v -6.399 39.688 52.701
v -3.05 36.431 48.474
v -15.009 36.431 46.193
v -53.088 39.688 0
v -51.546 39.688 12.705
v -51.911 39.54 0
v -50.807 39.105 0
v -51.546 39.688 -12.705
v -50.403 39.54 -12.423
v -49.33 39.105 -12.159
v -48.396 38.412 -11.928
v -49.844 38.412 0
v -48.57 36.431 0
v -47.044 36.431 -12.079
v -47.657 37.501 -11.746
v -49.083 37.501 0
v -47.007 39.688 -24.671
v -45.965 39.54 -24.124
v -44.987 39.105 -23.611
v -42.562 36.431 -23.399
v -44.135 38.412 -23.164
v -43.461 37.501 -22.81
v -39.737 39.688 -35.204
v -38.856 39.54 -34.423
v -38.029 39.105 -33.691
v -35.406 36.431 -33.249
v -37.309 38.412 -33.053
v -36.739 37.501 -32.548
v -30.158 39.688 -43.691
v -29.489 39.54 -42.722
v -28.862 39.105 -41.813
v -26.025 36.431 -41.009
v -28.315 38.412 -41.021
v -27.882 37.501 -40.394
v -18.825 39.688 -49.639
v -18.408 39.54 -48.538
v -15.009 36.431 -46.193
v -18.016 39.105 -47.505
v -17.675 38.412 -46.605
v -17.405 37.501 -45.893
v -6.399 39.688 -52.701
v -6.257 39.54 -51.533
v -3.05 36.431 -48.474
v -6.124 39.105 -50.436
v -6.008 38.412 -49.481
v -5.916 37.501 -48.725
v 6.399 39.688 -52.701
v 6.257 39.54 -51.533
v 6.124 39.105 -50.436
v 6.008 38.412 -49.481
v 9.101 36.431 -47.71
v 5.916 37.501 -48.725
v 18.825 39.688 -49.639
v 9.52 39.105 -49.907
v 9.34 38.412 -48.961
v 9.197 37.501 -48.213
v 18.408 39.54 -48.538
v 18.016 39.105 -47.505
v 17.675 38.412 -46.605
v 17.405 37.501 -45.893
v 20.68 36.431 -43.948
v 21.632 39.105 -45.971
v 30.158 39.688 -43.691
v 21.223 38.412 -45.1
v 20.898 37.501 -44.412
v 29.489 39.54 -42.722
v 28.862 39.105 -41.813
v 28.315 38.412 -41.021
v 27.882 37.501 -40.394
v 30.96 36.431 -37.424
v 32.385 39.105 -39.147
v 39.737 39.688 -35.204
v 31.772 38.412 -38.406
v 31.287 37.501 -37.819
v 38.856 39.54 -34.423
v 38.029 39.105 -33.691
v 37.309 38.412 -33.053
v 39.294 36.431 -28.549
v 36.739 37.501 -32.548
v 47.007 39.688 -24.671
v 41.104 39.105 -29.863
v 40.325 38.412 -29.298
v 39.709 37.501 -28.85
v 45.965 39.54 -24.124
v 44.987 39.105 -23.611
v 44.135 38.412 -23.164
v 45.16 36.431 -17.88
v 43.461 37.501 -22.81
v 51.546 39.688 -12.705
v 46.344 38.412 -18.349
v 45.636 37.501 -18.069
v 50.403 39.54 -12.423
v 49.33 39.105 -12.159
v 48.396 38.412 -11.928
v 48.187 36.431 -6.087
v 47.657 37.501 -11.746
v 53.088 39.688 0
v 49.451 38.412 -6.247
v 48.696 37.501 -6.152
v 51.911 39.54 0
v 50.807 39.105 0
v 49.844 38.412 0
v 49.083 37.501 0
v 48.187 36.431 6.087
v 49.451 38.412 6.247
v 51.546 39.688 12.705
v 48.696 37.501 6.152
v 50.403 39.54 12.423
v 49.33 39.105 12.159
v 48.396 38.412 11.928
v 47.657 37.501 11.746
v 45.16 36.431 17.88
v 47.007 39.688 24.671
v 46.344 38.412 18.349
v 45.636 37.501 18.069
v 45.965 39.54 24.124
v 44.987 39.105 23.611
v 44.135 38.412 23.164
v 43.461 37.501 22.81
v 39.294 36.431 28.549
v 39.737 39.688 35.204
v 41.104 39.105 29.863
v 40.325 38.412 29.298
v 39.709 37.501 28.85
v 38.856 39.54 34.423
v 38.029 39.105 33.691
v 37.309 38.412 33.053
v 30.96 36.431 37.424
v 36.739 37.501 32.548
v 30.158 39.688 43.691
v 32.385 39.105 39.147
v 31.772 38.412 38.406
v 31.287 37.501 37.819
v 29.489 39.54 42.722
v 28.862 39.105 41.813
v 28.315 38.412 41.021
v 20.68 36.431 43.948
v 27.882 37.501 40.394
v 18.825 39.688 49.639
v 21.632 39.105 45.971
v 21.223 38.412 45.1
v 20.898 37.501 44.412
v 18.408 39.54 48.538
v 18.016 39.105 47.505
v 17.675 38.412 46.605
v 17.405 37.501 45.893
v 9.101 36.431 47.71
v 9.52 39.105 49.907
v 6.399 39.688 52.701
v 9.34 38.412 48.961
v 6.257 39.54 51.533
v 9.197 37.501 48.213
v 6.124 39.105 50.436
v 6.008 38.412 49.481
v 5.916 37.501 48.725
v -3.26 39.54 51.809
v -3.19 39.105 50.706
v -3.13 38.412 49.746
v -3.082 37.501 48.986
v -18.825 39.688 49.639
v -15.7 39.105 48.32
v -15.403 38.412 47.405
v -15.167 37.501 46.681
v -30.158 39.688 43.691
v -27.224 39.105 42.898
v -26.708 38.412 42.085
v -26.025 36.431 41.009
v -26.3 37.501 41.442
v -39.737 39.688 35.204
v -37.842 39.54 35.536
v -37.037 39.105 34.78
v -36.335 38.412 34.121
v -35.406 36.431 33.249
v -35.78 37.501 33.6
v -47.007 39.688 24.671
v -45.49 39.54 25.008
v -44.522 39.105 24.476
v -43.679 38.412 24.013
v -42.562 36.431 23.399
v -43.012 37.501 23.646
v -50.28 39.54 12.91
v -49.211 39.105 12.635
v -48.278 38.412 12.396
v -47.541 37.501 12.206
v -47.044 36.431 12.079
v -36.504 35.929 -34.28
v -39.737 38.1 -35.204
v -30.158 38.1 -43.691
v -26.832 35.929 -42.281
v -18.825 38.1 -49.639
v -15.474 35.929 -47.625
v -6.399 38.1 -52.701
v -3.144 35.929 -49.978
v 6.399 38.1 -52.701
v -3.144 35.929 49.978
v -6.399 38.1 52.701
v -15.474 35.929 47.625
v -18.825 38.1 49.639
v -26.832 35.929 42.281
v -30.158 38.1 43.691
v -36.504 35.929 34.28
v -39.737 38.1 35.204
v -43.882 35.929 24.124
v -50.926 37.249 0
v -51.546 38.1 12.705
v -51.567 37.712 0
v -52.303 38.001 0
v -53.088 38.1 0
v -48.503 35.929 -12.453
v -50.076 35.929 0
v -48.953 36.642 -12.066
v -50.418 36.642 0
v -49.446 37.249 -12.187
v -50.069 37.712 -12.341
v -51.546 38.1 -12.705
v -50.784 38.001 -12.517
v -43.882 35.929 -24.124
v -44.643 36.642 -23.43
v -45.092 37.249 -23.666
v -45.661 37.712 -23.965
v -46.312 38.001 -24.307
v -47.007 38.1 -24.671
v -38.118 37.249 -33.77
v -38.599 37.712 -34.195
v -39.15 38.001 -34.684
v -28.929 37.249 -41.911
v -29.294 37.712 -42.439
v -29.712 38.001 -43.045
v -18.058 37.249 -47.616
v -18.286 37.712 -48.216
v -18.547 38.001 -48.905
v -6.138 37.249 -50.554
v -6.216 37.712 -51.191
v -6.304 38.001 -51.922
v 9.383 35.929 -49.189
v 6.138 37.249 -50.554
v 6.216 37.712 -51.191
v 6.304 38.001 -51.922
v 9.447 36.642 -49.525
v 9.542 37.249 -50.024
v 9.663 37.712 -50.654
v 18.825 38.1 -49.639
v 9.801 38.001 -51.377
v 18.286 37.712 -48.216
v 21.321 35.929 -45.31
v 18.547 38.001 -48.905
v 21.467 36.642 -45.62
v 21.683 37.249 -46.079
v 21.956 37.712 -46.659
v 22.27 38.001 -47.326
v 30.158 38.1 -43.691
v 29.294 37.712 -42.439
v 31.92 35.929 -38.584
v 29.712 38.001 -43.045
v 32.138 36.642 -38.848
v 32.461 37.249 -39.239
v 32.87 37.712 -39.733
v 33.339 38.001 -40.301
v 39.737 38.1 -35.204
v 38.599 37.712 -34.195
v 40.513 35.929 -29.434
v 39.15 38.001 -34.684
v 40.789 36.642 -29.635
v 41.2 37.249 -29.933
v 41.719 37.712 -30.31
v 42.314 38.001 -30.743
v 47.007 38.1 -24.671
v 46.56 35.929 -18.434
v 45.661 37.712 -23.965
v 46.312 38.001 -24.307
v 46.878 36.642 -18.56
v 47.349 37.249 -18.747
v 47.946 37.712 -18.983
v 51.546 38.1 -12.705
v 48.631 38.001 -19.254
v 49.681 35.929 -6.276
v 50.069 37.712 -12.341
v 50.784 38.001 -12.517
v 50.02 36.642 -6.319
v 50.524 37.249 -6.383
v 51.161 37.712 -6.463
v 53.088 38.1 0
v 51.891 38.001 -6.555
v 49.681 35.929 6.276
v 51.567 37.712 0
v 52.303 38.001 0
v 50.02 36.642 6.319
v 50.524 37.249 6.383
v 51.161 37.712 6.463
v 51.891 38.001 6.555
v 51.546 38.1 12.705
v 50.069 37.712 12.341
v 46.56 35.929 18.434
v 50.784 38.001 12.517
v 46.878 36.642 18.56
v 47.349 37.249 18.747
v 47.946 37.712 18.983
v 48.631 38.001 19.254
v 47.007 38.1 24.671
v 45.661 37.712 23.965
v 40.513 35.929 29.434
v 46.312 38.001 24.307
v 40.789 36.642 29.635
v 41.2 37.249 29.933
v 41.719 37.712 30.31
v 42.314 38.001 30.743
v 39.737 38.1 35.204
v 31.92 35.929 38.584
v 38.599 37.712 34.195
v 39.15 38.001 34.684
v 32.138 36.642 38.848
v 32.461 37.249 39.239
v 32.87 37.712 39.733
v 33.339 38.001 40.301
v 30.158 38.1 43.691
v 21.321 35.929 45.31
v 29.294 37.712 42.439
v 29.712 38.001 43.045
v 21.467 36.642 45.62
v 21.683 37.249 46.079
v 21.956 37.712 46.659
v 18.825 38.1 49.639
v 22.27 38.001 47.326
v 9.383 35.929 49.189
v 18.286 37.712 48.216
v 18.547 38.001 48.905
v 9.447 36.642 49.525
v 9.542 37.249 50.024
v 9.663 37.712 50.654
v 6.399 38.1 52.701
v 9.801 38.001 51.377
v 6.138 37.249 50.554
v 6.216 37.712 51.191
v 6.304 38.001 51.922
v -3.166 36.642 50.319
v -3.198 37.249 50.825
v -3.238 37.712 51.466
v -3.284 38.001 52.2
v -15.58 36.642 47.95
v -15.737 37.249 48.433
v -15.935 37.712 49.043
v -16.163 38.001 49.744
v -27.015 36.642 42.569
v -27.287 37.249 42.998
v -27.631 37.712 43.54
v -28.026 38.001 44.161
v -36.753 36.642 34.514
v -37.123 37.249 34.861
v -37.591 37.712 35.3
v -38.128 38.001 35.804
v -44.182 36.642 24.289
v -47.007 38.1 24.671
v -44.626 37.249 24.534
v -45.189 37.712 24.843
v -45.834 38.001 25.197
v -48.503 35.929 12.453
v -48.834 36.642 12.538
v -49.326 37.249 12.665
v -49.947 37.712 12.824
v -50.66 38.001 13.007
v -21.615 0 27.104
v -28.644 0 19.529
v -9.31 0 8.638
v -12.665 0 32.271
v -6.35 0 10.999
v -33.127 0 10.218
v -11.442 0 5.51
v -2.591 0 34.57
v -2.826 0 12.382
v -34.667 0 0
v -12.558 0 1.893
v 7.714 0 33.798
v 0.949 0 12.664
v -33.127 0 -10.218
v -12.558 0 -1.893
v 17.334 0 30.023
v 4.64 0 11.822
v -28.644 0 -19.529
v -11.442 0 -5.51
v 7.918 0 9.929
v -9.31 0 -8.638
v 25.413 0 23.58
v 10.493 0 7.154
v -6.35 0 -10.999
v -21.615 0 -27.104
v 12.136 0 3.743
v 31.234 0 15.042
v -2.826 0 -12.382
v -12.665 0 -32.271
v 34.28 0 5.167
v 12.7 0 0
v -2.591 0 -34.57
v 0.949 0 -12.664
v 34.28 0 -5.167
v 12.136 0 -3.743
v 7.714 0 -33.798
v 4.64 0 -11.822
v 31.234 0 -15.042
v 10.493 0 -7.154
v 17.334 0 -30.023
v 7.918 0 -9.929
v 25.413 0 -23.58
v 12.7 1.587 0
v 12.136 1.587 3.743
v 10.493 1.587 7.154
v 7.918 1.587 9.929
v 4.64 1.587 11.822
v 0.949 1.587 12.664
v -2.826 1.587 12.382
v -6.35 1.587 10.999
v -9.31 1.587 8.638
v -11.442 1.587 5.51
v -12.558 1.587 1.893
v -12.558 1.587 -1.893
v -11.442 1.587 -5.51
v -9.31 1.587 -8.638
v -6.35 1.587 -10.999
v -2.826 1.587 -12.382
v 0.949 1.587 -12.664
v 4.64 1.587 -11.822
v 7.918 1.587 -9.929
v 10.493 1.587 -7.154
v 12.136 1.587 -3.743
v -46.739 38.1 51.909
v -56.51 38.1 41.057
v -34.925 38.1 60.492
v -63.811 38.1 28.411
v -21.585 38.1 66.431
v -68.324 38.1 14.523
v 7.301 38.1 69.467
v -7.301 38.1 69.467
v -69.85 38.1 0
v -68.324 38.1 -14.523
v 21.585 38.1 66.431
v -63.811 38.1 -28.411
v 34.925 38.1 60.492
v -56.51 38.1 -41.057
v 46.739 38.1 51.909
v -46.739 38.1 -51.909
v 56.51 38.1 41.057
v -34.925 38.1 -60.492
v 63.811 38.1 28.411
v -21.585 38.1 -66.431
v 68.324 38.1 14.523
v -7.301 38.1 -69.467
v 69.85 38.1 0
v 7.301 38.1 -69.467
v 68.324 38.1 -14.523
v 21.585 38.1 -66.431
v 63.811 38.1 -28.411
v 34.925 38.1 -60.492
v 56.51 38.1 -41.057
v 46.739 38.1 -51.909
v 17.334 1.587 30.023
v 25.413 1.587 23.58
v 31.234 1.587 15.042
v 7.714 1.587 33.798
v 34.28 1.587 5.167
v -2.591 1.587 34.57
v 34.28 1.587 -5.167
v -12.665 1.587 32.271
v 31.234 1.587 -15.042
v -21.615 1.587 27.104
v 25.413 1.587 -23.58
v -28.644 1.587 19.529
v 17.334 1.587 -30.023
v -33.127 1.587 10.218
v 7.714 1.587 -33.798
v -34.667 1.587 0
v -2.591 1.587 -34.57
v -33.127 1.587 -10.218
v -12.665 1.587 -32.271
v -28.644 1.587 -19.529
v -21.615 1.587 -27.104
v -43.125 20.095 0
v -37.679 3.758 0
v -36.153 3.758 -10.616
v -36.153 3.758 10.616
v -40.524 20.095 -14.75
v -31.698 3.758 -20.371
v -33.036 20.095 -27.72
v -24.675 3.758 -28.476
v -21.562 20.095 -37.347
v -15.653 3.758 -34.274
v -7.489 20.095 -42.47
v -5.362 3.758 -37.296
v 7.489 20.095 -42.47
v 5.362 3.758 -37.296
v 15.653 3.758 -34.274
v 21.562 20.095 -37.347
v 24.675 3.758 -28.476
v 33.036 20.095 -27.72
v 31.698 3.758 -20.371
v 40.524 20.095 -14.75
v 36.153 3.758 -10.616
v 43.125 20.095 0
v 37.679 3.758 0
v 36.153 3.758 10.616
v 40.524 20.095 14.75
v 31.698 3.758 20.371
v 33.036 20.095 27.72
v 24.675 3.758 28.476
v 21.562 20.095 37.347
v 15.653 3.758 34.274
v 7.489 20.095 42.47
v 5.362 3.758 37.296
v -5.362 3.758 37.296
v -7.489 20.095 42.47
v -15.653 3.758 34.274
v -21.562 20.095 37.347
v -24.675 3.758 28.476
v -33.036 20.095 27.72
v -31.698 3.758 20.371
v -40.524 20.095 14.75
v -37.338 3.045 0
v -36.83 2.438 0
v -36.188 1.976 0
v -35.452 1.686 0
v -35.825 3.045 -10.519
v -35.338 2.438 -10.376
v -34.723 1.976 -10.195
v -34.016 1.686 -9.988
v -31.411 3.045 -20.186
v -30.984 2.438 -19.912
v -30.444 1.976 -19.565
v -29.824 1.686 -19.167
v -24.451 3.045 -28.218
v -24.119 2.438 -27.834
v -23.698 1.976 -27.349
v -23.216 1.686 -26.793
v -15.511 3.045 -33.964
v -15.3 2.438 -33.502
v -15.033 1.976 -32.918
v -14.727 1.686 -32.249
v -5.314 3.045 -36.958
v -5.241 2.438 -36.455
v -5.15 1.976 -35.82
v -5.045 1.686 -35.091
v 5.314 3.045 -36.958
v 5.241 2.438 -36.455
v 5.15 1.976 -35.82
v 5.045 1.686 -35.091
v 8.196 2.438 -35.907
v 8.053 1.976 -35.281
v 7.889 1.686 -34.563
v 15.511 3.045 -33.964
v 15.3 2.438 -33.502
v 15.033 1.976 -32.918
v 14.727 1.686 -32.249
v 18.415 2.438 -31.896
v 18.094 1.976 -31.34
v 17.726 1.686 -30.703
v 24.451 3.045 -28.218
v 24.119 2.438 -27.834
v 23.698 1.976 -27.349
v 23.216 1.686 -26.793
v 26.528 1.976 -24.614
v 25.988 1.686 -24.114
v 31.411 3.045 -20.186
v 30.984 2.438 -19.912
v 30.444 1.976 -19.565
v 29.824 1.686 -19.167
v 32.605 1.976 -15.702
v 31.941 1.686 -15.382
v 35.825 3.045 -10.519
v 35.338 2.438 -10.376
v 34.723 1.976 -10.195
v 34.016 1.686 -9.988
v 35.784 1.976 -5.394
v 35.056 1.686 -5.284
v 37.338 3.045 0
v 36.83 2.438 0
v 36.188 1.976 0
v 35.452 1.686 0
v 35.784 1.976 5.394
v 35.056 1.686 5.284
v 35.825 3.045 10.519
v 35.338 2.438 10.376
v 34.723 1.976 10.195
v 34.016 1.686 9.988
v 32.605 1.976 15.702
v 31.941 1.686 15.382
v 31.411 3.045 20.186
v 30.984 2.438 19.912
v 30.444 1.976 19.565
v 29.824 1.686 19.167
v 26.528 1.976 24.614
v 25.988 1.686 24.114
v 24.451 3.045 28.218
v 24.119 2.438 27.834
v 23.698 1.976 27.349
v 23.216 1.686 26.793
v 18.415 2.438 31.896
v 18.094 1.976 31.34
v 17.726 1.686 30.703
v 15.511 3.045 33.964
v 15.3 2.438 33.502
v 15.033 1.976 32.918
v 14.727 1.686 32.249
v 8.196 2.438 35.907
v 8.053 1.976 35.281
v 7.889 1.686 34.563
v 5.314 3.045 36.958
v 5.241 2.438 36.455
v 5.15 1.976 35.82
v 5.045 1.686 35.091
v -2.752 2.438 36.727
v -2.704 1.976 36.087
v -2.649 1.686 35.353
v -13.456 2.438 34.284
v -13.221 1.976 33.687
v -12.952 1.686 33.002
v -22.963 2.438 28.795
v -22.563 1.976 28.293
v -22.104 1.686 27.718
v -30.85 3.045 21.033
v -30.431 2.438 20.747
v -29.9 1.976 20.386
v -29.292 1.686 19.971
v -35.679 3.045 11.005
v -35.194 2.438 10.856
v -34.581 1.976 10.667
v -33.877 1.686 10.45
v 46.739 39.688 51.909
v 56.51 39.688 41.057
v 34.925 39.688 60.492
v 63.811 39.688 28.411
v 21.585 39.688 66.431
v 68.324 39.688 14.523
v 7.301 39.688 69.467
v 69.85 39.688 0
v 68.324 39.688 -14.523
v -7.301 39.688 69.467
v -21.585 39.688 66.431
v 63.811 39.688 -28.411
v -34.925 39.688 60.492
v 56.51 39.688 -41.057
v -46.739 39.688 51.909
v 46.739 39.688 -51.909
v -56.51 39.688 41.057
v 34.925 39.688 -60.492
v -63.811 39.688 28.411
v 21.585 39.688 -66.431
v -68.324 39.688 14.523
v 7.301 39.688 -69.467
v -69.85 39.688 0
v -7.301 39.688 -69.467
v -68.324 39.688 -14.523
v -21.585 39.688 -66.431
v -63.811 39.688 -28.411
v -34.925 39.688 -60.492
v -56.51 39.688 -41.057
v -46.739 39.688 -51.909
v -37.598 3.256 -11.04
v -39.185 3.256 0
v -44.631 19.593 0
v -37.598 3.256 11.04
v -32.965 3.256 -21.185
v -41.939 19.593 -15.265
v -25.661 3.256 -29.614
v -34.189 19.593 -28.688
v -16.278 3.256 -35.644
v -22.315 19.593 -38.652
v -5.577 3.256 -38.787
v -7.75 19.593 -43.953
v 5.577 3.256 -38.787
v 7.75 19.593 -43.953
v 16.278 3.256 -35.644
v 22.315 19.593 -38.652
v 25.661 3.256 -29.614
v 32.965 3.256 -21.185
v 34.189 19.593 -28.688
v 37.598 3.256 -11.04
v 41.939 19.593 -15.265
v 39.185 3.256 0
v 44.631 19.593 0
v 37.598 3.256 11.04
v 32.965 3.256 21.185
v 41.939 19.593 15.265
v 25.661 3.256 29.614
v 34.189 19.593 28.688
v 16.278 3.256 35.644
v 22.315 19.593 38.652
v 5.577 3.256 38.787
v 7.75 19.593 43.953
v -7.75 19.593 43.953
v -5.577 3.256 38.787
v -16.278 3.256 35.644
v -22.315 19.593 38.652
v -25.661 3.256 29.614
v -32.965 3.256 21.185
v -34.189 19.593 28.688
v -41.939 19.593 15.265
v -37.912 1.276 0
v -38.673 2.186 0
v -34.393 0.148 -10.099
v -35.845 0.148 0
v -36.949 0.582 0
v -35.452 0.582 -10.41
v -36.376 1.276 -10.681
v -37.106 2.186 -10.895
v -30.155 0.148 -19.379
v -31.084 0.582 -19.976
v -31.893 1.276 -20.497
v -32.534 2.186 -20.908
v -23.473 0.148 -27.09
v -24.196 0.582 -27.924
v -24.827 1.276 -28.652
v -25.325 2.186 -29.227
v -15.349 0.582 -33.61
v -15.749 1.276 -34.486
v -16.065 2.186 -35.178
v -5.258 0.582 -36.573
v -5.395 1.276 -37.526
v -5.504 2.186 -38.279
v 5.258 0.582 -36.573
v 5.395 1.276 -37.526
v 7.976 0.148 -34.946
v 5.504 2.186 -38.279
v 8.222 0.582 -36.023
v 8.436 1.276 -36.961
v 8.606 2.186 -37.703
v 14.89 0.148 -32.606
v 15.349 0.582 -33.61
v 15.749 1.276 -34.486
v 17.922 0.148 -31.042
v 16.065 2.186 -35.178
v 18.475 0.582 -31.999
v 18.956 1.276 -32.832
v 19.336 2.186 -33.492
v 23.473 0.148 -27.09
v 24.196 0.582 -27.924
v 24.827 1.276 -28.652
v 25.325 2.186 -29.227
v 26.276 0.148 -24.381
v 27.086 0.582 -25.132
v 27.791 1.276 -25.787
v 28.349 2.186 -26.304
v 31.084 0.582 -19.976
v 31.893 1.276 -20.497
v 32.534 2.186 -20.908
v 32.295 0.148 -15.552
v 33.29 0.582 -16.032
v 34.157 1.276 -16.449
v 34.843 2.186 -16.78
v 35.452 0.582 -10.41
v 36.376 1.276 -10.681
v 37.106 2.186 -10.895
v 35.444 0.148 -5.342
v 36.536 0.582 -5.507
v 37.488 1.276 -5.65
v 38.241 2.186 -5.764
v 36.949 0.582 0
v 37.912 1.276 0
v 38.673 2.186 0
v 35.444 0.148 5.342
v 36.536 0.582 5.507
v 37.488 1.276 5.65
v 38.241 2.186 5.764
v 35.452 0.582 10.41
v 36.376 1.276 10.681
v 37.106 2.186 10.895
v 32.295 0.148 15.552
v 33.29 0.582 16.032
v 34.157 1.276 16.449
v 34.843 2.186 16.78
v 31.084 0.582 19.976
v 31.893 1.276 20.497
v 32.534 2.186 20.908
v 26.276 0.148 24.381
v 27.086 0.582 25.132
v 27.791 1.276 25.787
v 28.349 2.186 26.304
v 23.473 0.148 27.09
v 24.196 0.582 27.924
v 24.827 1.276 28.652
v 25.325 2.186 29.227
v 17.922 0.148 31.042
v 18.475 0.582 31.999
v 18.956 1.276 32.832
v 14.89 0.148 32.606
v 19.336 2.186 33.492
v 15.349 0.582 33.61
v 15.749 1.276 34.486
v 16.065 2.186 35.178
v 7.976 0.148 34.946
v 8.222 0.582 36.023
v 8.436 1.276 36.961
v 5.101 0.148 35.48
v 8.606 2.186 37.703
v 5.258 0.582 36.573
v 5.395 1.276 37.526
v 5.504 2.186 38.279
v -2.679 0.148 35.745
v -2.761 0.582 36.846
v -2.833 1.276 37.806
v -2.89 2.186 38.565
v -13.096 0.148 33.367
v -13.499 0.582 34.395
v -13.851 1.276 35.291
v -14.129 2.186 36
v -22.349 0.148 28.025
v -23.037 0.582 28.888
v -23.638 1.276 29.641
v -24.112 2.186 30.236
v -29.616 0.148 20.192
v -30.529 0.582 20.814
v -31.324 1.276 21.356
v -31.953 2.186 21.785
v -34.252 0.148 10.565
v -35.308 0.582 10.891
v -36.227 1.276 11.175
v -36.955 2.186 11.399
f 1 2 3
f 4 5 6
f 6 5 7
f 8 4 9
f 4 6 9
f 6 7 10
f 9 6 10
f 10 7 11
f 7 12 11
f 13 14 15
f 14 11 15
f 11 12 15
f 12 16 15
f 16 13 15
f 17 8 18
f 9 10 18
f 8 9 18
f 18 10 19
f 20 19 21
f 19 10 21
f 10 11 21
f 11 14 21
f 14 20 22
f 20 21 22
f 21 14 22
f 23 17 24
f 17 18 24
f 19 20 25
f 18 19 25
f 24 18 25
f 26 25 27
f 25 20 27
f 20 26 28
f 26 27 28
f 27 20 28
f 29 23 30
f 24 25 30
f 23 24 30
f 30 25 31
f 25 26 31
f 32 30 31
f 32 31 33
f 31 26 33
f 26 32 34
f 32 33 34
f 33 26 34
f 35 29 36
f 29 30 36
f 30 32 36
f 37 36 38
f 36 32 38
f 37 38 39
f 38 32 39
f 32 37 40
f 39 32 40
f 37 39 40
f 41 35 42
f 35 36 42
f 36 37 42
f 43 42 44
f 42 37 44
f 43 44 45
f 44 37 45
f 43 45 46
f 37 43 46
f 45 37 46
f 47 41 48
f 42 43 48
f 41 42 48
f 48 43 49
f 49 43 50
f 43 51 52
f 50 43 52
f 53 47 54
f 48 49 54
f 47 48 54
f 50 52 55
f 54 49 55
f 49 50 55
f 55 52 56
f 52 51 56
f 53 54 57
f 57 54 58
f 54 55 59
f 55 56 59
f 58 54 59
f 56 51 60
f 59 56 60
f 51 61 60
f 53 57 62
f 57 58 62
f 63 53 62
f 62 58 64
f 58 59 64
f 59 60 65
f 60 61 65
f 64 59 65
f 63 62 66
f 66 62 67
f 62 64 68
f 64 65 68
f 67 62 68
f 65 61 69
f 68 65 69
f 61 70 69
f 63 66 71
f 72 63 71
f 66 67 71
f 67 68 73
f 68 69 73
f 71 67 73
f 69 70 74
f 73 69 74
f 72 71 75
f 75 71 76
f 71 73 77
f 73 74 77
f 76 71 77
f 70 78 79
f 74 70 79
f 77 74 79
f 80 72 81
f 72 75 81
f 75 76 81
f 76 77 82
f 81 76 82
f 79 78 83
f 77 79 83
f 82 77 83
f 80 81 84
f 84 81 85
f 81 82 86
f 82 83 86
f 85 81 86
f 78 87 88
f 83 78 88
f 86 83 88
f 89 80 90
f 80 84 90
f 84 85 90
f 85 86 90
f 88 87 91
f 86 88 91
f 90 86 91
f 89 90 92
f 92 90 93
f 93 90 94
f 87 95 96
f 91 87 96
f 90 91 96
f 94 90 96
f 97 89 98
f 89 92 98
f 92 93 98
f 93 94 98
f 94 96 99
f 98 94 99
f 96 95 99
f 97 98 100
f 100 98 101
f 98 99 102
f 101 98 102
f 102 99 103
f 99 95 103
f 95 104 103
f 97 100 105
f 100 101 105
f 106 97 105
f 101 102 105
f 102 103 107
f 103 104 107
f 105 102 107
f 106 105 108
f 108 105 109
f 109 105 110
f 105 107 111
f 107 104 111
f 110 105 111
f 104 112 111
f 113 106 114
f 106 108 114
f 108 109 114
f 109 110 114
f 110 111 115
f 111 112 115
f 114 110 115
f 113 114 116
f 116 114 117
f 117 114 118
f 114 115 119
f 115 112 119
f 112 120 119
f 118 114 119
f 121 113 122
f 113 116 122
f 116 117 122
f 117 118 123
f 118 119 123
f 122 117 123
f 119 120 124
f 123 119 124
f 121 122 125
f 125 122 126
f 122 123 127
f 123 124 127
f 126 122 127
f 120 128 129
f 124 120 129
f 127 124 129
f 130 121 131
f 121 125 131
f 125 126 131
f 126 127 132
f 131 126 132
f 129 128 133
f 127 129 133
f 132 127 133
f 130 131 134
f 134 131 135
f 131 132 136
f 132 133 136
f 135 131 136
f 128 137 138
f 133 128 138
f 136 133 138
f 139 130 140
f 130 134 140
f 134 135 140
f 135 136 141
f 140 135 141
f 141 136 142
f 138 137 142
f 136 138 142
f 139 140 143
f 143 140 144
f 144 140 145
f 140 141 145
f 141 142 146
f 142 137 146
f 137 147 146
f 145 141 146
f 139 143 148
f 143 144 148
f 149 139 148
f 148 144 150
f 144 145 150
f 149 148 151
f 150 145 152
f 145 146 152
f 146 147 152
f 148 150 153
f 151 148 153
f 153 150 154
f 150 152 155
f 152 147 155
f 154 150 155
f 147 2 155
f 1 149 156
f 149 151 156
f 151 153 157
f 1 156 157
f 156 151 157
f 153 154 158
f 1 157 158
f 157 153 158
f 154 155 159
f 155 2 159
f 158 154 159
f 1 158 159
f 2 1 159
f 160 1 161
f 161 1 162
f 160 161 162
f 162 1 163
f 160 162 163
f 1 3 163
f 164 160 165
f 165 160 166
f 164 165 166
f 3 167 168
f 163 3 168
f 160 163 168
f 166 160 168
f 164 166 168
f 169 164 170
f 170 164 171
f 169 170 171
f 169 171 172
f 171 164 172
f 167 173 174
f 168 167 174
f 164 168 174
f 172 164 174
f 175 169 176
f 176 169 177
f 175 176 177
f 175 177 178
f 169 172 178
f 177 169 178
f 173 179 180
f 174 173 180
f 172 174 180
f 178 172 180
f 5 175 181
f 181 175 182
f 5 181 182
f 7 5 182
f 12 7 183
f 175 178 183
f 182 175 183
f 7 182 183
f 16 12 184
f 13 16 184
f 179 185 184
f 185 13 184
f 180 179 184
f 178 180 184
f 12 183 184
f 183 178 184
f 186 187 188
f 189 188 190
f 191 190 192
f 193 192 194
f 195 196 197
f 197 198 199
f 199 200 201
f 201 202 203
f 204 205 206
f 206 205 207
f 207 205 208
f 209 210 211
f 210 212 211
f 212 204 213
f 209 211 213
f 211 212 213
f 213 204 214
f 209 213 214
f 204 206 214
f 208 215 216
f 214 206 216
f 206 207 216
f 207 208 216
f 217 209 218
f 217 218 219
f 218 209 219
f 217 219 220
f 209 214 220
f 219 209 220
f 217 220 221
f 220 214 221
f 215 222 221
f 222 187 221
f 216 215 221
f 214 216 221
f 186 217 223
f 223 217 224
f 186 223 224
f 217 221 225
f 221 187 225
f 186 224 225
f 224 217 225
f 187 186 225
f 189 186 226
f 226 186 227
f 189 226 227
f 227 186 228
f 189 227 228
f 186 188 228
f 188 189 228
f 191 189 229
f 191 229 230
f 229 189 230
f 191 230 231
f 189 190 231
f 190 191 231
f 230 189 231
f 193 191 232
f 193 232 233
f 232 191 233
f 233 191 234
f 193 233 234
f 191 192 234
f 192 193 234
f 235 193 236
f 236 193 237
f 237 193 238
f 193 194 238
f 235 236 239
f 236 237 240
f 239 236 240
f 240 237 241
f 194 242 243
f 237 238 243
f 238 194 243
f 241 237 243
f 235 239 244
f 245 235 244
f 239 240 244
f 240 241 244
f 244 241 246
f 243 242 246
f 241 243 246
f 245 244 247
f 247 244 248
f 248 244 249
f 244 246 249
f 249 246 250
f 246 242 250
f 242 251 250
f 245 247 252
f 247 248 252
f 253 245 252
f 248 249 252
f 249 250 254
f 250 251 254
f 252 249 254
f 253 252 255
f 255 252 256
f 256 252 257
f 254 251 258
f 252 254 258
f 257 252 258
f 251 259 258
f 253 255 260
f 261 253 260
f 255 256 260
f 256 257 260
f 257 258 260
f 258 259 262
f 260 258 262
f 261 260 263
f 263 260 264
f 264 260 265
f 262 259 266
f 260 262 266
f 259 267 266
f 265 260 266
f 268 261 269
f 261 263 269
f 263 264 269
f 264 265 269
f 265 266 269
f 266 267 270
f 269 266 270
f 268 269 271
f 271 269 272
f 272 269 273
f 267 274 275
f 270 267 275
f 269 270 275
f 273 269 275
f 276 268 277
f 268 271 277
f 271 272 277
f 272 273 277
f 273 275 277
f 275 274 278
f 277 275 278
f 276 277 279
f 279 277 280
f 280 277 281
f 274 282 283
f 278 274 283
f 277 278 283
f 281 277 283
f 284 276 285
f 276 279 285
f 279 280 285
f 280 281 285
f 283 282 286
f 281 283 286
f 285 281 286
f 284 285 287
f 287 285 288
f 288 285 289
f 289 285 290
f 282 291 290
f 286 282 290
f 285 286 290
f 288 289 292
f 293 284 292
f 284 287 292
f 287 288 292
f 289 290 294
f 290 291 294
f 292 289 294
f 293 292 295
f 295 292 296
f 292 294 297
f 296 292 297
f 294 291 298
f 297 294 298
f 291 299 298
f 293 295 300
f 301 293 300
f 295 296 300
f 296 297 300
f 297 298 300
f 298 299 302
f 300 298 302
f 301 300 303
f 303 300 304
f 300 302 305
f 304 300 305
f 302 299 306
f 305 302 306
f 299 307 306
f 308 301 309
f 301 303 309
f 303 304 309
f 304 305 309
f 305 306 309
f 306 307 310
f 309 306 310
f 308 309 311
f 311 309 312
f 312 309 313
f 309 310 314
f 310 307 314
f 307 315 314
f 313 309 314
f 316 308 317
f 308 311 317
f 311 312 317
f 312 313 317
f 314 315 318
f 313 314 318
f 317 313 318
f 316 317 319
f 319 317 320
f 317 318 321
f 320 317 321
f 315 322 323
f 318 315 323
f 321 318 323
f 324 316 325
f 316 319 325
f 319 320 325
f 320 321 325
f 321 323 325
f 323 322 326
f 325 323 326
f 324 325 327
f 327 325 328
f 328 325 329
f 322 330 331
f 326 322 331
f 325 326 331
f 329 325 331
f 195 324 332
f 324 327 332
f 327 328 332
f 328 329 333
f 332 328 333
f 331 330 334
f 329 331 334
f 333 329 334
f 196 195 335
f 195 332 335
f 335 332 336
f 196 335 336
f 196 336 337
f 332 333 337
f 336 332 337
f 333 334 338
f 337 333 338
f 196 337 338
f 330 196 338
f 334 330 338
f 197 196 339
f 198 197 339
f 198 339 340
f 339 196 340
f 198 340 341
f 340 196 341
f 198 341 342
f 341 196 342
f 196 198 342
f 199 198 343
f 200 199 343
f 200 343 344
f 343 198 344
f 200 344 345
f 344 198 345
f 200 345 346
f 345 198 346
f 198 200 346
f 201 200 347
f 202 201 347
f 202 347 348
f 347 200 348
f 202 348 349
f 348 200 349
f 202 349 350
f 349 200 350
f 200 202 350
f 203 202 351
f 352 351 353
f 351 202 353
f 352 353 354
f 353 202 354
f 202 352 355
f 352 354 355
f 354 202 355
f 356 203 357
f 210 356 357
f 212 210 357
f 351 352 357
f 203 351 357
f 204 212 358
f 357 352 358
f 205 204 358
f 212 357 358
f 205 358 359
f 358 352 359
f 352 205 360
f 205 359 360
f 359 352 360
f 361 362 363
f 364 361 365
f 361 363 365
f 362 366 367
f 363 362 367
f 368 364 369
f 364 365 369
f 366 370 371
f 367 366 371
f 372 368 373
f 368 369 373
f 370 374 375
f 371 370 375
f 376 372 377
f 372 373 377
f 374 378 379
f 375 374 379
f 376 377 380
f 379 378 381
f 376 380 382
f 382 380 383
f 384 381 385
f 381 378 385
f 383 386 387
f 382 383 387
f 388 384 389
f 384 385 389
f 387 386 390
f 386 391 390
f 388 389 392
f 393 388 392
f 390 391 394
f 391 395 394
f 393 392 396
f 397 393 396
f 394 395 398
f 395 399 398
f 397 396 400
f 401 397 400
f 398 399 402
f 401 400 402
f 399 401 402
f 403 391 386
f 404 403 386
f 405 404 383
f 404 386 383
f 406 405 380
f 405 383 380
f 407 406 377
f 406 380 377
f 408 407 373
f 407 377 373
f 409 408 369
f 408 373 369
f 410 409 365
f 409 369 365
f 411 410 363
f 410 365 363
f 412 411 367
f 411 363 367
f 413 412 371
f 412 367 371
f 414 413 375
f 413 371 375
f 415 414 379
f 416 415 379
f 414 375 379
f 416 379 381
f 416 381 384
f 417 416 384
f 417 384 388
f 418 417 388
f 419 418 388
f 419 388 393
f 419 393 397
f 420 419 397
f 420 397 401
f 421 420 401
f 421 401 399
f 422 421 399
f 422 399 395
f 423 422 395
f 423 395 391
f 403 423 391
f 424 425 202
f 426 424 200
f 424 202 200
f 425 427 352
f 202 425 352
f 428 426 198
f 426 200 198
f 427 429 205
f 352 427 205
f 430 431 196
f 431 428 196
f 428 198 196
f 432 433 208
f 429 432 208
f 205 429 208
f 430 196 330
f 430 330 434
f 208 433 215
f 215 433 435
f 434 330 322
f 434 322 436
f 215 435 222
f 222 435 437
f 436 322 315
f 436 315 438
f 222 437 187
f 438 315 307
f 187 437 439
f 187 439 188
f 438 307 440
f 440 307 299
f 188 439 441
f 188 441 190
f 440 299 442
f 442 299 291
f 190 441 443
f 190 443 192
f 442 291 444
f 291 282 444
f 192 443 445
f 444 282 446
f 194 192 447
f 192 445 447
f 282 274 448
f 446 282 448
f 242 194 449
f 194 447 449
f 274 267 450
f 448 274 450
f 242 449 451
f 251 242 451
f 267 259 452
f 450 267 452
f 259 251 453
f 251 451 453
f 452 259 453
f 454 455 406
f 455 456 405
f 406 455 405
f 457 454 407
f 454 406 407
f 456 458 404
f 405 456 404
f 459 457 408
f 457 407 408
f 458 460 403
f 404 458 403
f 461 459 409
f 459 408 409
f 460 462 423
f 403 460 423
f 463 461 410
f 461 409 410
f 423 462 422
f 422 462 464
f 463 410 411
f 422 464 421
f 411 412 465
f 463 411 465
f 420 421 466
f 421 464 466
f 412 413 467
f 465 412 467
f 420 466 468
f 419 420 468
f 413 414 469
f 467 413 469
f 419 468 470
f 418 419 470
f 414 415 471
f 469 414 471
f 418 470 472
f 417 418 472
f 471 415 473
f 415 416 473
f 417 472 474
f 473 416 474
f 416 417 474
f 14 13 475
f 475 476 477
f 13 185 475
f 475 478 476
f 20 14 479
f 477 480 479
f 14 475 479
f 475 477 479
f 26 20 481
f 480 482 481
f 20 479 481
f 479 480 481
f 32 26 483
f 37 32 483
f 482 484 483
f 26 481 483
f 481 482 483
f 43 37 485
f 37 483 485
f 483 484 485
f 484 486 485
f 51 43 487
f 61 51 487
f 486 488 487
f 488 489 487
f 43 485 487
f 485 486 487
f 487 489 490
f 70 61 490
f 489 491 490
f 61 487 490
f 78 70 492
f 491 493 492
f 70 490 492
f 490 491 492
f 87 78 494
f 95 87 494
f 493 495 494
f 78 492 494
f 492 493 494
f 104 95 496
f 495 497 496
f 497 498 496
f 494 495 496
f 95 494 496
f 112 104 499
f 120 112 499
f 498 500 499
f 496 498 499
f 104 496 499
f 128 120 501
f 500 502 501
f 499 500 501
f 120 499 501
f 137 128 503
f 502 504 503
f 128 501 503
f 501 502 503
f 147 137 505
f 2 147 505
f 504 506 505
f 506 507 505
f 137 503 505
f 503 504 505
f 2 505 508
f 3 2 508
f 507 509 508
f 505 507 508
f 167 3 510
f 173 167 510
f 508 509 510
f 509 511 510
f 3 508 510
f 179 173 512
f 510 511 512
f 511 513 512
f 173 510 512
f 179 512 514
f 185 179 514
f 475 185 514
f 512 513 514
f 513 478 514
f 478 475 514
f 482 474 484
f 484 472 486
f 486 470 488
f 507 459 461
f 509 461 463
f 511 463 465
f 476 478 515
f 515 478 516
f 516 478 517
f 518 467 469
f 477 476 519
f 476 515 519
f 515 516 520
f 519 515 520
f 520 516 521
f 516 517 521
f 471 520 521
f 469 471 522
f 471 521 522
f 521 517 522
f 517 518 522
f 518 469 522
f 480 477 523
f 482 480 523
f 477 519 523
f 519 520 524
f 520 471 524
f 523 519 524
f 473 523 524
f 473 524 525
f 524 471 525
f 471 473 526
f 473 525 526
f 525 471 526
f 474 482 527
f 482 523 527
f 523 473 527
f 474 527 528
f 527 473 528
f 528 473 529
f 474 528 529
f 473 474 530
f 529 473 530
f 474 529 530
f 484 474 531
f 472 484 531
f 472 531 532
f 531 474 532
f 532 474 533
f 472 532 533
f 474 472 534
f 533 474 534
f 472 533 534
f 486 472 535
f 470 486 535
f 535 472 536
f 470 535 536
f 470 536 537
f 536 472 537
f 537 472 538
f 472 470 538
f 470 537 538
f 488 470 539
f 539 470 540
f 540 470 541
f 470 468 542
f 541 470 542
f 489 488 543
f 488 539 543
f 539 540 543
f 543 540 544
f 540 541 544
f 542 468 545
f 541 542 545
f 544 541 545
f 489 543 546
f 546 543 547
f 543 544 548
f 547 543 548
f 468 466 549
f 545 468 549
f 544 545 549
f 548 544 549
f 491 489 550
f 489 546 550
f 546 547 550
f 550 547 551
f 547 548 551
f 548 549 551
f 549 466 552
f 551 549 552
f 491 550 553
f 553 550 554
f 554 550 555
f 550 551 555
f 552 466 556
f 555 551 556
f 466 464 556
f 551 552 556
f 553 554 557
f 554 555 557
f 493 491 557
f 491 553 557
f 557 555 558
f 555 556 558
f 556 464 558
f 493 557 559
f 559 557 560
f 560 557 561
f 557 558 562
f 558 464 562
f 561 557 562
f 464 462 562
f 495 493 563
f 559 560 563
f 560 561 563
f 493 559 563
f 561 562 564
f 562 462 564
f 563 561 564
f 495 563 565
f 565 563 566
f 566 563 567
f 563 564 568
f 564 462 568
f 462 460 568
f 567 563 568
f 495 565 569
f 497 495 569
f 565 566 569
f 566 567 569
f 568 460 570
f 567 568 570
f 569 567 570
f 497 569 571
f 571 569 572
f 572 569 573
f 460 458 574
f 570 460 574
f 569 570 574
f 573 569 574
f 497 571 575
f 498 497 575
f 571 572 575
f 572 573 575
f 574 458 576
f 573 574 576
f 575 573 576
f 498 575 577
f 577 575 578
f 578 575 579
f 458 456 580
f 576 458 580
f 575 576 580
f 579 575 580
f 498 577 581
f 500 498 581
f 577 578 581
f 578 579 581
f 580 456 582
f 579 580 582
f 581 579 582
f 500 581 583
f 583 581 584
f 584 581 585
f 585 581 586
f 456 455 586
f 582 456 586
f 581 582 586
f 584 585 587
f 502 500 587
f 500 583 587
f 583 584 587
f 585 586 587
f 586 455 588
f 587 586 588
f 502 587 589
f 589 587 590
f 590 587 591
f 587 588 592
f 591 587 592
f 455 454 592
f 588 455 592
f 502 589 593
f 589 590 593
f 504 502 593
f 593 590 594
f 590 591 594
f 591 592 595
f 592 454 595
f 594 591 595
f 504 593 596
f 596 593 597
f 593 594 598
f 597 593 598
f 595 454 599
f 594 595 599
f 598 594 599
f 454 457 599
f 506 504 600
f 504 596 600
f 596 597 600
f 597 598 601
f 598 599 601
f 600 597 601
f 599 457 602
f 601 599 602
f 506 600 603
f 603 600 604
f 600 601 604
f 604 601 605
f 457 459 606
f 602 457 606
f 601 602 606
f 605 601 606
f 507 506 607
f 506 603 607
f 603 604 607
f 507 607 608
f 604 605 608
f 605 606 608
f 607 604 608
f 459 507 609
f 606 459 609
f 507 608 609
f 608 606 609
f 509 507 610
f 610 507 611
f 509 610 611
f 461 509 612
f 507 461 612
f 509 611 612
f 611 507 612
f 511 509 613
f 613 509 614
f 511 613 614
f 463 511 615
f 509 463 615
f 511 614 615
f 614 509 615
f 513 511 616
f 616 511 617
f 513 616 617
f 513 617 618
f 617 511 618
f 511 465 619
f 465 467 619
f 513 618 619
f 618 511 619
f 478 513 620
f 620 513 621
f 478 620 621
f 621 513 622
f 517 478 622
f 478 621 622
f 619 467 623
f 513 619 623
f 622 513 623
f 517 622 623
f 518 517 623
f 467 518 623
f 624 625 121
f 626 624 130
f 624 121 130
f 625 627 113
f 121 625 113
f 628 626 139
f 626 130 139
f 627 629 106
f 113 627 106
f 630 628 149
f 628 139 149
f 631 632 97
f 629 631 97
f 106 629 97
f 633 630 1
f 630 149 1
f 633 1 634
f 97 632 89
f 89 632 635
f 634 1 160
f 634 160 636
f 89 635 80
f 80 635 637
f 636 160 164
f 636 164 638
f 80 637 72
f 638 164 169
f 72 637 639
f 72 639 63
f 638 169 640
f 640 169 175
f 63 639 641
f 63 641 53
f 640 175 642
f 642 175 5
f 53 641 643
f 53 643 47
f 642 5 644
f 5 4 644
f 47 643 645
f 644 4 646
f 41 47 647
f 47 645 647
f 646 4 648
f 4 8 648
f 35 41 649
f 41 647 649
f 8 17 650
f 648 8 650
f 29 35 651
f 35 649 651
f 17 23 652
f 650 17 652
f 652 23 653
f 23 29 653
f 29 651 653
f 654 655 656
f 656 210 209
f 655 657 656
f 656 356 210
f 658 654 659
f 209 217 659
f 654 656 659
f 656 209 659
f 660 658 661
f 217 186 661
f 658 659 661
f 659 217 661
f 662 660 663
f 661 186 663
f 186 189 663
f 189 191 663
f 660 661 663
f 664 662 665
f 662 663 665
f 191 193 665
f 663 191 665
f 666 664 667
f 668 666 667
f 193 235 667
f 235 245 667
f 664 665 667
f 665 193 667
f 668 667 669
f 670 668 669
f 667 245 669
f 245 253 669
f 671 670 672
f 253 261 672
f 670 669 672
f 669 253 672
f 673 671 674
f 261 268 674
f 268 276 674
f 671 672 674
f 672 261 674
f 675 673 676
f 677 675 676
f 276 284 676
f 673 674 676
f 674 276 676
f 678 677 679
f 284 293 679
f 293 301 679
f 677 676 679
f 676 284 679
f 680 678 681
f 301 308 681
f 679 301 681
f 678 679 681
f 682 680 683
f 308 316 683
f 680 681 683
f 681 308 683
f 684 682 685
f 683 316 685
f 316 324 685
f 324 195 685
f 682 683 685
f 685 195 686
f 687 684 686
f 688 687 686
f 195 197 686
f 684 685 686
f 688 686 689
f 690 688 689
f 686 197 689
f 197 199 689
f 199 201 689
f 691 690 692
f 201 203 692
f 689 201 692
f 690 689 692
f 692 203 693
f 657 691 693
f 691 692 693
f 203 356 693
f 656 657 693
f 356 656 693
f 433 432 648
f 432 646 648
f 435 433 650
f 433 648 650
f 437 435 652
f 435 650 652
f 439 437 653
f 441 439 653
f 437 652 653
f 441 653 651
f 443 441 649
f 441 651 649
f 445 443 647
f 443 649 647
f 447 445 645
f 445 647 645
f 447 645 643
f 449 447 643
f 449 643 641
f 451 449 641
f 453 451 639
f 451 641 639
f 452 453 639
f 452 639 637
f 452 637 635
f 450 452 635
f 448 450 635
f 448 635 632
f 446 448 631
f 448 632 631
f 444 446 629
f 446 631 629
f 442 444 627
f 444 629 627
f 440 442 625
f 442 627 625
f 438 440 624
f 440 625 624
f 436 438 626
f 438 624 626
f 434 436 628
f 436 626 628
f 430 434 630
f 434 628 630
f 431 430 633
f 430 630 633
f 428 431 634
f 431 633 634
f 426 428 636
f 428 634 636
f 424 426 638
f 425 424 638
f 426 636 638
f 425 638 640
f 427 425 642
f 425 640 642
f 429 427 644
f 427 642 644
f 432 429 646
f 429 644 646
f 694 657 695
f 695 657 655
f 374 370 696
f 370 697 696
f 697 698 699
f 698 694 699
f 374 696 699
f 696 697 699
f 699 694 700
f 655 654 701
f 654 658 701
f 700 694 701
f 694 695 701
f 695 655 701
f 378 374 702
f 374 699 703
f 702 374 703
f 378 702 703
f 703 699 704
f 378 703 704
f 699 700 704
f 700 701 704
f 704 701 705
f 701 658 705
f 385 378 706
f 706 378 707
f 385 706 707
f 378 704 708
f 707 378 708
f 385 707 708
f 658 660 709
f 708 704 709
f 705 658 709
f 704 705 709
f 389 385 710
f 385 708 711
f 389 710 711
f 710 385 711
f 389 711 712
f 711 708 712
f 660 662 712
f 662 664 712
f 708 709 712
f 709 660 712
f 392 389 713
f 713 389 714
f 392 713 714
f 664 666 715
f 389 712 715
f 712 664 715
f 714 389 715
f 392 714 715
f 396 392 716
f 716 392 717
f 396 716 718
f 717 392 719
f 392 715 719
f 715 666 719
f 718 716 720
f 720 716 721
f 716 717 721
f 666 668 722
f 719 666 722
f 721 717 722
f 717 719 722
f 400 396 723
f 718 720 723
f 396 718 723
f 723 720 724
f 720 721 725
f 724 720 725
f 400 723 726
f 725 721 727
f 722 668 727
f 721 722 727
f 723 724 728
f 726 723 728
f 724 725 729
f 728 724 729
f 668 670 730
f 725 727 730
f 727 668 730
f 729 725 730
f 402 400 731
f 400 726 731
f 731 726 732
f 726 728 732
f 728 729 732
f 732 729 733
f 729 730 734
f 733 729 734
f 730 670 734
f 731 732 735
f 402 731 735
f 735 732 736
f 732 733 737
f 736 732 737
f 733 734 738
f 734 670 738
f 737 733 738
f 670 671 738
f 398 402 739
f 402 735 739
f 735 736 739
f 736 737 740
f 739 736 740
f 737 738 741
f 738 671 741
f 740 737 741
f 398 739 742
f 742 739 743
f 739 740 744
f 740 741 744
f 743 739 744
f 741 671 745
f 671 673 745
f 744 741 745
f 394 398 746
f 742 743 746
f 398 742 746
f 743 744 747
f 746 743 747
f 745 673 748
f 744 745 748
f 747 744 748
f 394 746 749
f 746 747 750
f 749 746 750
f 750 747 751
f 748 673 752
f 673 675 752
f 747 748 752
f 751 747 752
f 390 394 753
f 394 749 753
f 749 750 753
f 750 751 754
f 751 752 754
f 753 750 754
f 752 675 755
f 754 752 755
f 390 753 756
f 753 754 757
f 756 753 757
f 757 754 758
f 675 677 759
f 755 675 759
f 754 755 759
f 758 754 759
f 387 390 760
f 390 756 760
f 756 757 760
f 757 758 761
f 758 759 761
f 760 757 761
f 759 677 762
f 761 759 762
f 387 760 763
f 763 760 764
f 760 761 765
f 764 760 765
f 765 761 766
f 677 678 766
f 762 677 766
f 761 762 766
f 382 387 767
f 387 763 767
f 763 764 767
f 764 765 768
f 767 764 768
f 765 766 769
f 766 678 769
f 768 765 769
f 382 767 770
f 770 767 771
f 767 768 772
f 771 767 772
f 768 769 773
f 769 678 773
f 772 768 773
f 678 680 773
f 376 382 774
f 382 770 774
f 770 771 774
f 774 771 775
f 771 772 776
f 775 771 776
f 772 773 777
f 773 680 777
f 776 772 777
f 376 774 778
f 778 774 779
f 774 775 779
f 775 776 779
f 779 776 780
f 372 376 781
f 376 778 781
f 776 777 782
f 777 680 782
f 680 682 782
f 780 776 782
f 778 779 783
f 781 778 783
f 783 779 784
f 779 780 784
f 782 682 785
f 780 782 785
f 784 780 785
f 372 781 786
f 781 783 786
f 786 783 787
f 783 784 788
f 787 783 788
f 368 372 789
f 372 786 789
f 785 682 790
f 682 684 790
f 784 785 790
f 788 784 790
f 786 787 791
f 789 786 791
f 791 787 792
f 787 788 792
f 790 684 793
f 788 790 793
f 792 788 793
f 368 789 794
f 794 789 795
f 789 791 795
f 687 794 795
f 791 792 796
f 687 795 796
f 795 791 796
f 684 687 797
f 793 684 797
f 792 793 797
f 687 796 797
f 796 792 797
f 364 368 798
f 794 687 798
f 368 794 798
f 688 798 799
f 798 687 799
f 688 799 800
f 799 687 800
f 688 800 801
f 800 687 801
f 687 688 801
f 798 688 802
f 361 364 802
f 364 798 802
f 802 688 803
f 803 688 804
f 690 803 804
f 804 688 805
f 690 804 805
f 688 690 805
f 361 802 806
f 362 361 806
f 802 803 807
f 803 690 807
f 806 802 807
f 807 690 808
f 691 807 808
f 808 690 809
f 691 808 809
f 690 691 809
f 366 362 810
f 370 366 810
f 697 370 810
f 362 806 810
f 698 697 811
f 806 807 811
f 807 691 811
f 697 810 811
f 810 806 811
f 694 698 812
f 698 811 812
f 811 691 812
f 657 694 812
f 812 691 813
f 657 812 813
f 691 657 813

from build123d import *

# Parameters (mm, degrees)
SKETCH2_R          = 12.7
CUT_EXTRUDE1_DEPTH = 40.6875


with BuildPart() as part:
    # Sketch1 → Revolve-Thin1 (revolve)
    with BuildSketch(Plane.XY):
        with BuildLine():
            Line((0, 0), (-34.667384214, 0))
            ThreePointArc((-34.667384214, 0), (-37.452066945, 0.898959093), (-39.185488421, 3.256465264))
            Line((-39.185488421, 3.256465264), (-50.076341052, 35.929023157))
            ThreePointArc((-50.076341052, 35.929023157), (-51.23195537, 37.500693938), (-53.088410524, 38.1))
            Line((-53.088410524, 38.1), (-69.85, 38.1))
            Line((-69.85, 38.1), (-69.85, 39.6875))
            Line((-69.85, 39.6875), (-53.088410524, 39.6875))
            ThreePointArc((-53.088410524, 39.6875), (-50.303727793, 38.788540907), (-48.570306317, 36.431034736))
            Line((-48.570306317, 36.431034736), (-37.679453686, 3.758476843))
            ThreePointArc((-37.679453686, 3.758476843), (-36.523839368, 2.186806062), (-34.667384214, 1.5875))
            Line((-34.667384214, 1.5875), (0, 1.5875))
            Line((0, 1.5875), (0, 0))
        make_face()
    revolve(axis=Axis((0, 40.501267427, 0), (0, -1, 0)))

    # Sketch2 → Cut-Extrude1 (cut, through all)
    with BuildSketch(Plane.XZ):
        Circle(SKETCH2_R)
    extrude(amount=-CUT_EXTRUDE1_DEPTH, mode=Mode.SUBTRACT)


solid = part.part
